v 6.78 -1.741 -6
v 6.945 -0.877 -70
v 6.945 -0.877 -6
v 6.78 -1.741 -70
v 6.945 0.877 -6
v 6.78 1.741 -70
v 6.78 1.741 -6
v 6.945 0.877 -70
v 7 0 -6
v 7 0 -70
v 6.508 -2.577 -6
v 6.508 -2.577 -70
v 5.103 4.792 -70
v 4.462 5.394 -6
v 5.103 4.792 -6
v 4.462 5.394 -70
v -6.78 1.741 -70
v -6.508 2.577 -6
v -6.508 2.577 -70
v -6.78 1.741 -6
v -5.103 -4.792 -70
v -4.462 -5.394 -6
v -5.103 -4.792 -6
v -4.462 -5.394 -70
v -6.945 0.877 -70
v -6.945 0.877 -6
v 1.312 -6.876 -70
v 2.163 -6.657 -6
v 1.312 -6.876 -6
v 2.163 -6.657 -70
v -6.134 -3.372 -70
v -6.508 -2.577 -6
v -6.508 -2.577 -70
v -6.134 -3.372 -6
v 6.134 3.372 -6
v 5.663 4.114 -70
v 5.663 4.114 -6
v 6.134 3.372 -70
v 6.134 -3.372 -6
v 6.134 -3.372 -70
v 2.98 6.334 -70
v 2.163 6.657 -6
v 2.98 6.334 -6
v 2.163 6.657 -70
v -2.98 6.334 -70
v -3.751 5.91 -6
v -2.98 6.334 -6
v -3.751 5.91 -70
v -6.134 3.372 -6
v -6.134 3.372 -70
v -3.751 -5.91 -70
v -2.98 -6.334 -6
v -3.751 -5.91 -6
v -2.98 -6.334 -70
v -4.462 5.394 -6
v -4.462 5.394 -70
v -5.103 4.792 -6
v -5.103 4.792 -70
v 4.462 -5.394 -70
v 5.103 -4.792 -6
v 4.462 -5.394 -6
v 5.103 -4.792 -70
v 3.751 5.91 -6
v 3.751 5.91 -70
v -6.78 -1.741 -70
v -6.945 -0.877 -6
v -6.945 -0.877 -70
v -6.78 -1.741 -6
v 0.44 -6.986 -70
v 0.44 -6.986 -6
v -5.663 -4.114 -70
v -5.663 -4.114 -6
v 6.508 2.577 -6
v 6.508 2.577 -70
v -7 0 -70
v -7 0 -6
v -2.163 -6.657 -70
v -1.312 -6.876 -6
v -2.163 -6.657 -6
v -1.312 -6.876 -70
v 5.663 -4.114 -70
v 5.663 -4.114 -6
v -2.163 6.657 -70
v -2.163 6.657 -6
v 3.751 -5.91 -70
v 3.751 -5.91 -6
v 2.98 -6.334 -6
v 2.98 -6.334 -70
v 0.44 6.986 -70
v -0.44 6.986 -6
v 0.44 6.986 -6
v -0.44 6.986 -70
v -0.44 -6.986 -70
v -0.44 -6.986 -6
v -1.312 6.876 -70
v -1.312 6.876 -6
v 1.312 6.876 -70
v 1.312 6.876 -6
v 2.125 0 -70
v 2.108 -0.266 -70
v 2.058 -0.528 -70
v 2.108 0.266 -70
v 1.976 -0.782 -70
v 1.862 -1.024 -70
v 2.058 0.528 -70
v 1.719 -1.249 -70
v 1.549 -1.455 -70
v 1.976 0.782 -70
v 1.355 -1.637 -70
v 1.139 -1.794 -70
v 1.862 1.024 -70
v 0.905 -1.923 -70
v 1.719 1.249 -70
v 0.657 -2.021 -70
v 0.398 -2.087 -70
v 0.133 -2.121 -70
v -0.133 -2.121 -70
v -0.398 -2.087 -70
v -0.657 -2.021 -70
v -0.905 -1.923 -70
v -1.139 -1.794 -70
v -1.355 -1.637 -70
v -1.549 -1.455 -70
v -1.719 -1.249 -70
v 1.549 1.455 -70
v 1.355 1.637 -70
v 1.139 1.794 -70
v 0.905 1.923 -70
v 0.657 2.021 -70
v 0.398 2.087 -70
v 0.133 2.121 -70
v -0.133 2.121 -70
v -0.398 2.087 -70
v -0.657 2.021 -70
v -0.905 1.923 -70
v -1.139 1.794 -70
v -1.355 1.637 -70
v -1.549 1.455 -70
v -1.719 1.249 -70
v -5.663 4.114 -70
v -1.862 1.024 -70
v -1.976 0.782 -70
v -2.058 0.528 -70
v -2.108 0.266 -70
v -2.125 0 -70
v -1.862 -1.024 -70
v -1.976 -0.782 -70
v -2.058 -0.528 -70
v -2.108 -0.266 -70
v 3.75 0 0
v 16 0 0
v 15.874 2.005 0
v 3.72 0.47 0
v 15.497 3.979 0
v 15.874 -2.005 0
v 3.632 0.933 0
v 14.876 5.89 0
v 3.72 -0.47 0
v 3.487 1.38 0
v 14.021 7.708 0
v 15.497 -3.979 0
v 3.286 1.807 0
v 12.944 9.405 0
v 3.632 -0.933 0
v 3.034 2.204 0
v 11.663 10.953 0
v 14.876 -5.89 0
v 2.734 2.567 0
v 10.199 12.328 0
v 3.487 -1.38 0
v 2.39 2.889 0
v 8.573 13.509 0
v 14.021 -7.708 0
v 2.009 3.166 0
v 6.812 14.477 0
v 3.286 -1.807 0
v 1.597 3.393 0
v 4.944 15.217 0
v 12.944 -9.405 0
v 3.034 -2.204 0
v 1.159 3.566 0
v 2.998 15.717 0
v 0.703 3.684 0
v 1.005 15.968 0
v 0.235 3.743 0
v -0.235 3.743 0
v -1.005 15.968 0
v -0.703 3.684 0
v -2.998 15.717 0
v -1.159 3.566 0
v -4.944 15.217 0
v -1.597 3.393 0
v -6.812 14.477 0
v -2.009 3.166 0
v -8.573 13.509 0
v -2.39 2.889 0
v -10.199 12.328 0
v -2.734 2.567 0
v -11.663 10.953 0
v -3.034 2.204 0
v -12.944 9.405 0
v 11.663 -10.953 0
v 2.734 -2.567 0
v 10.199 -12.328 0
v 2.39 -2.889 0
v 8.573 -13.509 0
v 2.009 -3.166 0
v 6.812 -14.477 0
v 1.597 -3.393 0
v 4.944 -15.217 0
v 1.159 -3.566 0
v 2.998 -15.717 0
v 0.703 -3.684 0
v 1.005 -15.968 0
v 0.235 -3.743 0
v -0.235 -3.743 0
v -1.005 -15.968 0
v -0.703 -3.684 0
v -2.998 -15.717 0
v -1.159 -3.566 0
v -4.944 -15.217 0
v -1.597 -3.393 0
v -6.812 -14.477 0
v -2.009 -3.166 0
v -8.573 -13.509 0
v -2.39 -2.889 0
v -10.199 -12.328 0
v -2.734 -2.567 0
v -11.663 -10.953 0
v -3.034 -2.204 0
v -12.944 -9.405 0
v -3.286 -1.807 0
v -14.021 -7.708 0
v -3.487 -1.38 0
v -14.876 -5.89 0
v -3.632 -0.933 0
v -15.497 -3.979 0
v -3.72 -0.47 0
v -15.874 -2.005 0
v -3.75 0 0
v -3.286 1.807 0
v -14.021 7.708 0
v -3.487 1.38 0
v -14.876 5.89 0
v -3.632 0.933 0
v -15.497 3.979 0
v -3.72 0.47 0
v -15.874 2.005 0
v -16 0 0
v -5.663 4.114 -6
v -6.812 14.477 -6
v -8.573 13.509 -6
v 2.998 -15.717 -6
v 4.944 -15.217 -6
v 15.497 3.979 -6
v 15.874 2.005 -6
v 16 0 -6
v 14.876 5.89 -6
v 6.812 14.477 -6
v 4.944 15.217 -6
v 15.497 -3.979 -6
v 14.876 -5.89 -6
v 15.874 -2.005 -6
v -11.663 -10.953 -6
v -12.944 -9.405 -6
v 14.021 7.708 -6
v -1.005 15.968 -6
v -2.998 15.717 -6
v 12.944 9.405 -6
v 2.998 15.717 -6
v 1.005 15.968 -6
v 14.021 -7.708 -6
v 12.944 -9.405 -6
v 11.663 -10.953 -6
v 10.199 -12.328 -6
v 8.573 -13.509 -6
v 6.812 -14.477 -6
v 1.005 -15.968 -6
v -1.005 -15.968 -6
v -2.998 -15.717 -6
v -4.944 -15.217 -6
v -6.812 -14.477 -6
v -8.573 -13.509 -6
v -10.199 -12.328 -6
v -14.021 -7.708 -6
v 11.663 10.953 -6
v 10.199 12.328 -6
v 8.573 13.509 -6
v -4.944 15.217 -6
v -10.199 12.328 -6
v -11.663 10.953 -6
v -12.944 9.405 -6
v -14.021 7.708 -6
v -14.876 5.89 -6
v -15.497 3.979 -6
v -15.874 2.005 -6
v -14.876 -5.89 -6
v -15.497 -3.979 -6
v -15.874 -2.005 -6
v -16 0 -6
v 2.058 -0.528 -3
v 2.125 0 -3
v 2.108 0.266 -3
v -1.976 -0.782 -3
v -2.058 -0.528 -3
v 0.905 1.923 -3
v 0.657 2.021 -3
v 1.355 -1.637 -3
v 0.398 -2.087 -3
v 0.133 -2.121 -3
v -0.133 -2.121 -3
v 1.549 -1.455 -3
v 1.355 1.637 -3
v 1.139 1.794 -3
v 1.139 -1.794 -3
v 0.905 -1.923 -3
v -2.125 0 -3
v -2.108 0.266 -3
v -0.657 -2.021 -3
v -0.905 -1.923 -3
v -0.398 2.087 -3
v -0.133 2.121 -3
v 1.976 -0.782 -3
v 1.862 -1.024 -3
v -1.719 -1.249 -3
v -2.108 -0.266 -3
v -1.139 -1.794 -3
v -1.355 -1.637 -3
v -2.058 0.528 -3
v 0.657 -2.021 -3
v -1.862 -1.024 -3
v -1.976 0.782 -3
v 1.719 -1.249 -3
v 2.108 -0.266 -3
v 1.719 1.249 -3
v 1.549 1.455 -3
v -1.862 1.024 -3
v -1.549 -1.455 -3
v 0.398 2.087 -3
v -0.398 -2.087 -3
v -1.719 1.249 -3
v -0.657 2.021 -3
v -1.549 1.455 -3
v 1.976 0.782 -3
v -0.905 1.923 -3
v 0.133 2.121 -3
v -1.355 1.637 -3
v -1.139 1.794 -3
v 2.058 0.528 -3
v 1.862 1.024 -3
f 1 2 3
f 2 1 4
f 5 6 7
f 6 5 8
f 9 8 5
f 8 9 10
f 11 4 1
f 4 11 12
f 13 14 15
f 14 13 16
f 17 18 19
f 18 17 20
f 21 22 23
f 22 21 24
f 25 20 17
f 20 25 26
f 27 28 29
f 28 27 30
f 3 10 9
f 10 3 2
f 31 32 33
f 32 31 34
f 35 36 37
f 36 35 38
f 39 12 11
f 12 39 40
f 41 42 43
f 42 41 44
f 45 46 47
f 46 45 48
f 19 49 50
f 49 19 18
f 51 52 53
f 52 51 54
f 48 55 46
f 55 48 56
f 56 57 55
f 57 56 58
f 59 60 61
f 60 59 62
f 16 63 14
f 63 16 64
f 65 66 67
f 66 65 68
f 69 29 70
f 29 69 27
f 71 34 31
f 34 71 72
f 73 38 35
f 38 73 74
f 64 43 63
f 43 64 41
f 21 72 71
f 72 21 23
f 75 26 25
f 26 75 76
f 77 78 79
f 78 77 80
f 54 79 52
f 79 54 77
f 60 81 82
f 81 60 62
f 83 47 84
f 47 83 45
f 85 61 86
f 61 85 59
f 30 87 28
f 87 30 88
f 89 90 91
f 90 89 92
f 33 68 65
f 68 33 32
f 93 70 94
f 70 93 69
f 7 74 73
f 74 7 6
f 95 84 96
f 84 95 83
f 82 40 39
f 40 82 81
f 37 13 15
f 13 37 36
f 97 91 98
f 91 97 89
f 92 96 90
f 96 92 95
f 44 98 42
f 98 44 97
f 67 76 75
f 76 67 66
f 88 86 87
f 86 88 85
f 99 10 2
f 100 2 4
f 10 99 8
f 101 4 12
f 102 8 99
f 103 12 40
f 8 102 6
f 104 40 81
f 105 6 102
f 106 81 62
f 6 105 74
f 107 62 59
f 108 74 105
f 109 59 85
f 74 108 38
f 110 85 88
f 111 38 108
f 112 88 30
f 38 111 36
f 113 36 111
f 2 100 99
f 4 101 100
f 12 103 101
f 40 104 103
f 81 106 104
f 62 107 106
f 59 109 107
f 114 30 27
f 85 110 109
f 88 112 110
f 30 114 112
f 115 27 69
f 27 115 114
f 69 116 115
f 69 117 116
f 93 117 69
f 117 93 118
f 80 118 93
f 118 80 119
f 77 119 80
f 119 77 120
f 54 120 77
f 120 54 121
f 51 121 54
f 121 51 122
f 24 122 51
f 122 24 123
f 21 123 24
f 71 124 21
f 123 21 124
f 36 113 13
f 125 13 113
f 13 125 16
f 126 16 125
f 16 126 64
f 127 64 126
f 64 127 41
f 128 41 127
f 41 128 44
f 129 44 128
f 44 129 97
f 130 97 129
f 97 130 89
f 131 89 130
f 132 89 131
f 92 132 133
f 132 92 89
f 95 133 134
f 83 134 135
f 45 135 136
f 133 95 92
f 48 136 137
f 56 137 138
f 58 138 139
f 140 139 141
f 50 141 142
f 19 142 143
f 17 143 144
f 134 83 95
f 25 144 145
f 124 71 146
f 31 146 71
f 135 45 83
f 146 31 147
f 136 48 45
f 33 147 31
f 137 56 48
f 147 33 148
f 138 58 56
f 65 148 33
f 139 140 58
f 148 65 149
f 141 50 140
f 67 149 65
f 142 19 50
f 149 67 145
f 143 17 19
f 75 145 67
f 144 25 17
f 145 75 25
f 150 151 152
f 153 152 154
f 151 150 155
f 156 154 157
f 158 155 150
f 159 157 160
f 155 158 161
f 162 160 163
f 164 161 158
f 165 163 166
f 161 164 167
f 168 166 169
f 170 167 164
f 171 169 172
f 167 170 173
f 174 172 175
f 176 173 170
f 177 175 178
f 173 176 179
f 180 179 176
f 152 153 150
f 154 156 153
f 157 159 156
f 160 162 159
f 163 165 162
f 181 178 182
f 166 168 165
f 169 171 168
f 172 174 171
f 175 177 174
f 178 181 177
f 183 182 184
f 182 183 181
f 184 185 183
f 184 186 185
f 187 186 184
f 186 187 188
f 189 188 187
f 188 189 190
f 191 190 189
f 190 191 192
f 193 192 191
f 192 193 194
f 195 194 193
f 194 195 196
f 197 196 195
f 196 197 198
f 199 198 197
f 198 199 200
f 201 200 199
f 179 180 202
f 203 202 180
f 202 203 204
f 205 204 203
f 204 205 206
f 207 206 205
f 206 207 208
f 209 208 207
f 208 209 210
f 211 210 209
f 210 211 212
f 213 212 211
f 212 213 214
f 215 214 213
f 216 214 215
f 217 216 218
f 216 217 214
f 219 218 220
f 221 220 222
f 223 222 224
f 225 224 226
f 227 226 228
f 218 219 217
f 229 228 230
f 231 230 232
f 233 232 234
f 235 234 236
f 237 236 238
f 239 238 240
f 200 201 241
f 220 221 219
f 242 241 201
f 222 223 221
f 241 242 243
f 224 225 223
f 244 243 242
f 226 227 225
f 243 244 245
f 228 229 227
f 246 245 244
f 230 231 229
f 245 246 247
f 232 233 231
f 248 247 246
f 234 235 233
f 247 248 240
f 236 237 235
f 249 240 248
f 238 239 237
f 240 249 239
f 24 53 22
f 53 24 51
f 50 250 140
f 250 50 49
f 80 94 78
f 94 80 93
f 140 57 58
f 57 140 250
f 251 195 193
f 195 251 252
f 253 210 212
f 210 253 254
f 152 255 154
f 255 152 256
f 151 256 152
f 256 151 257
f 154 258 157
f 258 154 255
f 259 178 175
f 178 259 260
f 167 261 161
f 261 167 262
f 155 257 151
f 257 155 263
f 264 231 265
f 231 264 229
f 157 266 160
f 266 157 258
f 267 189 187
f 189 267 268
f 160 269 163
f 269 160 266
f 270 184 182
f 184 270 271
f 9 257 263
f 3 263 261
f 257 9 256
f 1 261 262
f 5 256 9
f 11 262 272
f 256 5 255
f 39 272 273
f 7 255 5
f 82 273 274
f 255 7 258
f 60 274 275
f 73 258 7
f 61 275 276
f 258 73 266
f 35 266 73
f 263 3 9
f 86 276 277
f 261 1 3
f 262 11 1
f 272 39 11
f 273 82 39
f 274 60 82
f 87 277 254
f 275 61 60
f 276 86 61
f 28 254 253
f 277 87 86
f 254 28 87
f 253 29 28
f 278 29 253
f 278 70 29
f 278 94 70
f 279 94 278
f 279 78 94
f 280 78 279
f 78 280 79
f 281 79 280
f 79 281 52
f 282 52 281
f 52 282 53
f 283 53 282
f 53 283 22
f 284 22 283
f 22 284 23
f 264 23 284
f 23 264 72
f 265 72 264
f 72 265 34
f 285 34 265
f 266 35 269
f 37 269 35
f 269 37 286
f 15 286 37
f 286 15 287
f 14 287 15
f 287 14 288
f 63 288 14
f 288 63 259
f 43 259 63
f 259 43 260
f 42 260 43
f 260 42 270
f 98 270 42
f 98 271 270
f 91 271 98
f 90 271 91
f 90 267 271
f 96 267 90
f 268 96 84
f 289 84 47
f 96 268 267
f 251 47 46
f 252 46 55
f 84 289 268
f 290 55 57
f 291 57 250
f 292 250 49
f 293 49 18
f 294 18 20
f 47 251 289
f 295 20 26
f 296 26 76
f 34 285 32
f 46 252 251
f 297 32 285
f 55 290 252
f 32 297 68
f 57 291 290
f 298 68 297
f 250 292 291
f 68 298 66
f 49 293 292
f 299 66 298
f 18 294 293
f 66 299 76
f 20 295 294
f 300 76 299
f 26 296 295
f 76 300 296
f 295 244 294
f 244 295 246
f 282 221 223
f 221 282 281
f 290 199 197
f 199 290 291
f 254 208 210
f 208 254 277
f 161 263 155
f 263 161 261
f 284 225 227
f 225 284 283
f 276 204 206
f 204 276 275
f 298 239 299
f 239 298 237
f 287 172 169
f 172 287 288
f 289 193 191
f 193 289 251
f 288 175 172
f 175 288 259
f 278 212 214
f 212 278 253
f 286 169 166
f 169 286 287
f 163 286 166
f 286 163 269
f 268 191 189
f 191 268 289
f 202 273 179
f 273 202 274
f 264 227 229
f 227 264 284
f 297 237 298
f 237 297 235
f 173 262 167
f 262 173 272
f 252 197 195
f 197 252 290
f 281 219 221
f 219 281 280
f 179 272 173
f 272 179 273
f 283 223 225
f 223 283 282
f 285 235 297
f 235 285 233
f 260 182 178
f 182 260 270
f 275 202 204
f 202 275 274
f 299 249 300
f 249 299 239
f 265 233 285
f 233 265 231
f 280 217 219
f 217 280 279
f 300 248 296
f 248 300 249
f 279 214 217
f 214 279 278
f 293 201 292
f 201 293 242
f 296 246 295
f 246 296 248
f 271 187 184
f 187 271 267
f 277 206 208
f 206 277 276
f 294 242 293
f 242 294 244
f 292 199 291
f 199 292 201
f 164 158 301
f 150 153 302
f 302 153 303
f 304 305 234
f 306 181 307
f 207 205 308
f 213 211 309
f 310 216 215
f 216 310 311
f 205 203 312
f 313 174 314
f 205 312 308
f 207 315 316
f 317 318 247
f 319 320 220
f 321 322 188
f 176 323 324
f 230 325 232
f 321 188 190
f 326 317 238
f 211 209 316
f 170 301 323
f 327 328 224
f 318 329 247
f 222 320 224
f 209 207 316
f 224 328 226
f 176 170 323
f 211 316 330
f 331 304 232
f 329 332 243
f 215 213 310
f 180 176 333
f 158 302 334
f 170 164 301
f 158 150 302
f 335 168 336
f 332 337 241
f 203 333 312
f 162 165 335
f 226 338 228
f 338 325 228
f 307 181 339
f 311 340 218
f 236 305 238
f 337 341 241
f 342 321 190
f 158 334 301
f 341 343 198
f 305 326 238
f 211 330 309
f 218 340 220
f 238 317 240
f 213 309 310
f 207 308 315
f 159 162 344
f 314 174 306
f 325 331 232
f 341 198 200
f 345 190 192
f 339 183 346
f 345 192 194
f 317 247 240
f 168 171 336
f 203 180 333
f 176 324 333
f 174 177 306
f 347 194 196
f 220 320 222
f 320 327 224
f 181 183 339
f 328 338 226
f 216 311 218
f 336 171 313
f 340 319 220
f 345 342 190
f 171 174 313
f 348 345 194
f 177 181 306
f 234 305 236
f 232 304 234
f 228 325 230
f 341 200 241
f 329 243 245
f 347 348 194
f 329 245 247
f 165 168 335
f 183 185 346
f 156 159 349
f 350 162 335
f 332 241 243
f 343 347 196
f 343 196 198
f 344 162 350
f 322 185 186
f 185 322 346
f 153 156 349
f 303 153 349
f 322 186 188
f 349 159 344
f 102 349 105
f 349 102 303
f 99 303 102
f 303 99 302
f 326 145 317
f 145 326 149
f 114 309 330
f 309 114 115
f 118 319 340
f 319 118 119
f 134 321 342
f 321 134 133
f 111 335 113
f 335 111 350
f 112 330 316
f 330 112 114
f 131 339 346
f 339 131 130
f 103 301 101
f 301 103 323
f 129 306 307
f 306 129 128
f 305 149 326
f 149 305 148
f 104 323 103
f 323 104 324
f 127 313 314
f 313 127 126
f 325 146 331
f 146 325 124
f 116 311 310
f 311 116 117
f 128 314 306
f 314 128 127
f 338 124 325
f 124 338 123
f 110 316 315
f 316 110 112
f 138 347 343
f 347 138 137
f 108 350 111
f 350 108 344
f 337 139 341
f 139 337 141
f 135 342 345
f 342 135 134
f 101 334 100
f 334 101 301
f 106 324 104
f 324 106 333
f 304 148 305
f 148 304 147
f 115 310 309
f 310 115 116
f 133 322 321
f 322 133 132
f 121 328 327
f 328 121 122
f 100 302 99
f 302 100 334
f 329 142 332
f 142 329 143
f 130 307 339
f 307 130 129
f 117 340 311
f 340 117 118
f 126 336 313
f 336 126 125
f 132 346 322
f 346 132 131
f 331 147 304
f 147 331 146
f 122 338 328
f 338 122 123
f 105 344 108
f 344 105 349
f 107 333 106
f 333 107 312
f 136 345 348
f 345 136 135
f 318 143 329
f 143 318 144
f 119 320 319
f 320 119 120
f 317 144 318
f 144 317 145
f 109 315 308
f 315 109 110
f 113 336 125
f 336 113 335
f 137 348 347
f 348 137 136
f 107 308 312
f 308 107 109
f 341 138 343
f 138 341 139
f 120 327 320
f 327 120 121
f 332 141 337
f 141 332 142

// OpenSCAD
$fn = 50;


difference() {
	union() {
		translate(v = [0, 0, -70.0000000000]) {
			cylinder(h = 70, r = 7.0000000000);
		}
		translate(v = [0, 0, -6.0000000000]) {
			cylinder(h = 6, r = 16.0000000000);
		}
	}
	union() {
		translate(v = [0, 0, 0]) {
			rotate(a = [0, 0, 0]) {
				difference() {
					union() {
						#translate(v = [0, 0, -70.0000000000]) {
							cylinder(h = 70, r = 2.0000000000);
						}
						#translate(v = [0, 0, -3]) {
							cylinder(h = 3, r1 = 2.1250000000, r2 = 3.7500000000);
						}
						#translate(v = [0, 0, -70.0000000000]) {
							cylinder(h = 70, r = 2.1250000000);
						}
						#translate(v = [0, 0, -70.0000000000]) {
							cylinder(h = 70, r = 2.0000000000);
						}
					}
					union();
				}
			}
		}
	}
}
